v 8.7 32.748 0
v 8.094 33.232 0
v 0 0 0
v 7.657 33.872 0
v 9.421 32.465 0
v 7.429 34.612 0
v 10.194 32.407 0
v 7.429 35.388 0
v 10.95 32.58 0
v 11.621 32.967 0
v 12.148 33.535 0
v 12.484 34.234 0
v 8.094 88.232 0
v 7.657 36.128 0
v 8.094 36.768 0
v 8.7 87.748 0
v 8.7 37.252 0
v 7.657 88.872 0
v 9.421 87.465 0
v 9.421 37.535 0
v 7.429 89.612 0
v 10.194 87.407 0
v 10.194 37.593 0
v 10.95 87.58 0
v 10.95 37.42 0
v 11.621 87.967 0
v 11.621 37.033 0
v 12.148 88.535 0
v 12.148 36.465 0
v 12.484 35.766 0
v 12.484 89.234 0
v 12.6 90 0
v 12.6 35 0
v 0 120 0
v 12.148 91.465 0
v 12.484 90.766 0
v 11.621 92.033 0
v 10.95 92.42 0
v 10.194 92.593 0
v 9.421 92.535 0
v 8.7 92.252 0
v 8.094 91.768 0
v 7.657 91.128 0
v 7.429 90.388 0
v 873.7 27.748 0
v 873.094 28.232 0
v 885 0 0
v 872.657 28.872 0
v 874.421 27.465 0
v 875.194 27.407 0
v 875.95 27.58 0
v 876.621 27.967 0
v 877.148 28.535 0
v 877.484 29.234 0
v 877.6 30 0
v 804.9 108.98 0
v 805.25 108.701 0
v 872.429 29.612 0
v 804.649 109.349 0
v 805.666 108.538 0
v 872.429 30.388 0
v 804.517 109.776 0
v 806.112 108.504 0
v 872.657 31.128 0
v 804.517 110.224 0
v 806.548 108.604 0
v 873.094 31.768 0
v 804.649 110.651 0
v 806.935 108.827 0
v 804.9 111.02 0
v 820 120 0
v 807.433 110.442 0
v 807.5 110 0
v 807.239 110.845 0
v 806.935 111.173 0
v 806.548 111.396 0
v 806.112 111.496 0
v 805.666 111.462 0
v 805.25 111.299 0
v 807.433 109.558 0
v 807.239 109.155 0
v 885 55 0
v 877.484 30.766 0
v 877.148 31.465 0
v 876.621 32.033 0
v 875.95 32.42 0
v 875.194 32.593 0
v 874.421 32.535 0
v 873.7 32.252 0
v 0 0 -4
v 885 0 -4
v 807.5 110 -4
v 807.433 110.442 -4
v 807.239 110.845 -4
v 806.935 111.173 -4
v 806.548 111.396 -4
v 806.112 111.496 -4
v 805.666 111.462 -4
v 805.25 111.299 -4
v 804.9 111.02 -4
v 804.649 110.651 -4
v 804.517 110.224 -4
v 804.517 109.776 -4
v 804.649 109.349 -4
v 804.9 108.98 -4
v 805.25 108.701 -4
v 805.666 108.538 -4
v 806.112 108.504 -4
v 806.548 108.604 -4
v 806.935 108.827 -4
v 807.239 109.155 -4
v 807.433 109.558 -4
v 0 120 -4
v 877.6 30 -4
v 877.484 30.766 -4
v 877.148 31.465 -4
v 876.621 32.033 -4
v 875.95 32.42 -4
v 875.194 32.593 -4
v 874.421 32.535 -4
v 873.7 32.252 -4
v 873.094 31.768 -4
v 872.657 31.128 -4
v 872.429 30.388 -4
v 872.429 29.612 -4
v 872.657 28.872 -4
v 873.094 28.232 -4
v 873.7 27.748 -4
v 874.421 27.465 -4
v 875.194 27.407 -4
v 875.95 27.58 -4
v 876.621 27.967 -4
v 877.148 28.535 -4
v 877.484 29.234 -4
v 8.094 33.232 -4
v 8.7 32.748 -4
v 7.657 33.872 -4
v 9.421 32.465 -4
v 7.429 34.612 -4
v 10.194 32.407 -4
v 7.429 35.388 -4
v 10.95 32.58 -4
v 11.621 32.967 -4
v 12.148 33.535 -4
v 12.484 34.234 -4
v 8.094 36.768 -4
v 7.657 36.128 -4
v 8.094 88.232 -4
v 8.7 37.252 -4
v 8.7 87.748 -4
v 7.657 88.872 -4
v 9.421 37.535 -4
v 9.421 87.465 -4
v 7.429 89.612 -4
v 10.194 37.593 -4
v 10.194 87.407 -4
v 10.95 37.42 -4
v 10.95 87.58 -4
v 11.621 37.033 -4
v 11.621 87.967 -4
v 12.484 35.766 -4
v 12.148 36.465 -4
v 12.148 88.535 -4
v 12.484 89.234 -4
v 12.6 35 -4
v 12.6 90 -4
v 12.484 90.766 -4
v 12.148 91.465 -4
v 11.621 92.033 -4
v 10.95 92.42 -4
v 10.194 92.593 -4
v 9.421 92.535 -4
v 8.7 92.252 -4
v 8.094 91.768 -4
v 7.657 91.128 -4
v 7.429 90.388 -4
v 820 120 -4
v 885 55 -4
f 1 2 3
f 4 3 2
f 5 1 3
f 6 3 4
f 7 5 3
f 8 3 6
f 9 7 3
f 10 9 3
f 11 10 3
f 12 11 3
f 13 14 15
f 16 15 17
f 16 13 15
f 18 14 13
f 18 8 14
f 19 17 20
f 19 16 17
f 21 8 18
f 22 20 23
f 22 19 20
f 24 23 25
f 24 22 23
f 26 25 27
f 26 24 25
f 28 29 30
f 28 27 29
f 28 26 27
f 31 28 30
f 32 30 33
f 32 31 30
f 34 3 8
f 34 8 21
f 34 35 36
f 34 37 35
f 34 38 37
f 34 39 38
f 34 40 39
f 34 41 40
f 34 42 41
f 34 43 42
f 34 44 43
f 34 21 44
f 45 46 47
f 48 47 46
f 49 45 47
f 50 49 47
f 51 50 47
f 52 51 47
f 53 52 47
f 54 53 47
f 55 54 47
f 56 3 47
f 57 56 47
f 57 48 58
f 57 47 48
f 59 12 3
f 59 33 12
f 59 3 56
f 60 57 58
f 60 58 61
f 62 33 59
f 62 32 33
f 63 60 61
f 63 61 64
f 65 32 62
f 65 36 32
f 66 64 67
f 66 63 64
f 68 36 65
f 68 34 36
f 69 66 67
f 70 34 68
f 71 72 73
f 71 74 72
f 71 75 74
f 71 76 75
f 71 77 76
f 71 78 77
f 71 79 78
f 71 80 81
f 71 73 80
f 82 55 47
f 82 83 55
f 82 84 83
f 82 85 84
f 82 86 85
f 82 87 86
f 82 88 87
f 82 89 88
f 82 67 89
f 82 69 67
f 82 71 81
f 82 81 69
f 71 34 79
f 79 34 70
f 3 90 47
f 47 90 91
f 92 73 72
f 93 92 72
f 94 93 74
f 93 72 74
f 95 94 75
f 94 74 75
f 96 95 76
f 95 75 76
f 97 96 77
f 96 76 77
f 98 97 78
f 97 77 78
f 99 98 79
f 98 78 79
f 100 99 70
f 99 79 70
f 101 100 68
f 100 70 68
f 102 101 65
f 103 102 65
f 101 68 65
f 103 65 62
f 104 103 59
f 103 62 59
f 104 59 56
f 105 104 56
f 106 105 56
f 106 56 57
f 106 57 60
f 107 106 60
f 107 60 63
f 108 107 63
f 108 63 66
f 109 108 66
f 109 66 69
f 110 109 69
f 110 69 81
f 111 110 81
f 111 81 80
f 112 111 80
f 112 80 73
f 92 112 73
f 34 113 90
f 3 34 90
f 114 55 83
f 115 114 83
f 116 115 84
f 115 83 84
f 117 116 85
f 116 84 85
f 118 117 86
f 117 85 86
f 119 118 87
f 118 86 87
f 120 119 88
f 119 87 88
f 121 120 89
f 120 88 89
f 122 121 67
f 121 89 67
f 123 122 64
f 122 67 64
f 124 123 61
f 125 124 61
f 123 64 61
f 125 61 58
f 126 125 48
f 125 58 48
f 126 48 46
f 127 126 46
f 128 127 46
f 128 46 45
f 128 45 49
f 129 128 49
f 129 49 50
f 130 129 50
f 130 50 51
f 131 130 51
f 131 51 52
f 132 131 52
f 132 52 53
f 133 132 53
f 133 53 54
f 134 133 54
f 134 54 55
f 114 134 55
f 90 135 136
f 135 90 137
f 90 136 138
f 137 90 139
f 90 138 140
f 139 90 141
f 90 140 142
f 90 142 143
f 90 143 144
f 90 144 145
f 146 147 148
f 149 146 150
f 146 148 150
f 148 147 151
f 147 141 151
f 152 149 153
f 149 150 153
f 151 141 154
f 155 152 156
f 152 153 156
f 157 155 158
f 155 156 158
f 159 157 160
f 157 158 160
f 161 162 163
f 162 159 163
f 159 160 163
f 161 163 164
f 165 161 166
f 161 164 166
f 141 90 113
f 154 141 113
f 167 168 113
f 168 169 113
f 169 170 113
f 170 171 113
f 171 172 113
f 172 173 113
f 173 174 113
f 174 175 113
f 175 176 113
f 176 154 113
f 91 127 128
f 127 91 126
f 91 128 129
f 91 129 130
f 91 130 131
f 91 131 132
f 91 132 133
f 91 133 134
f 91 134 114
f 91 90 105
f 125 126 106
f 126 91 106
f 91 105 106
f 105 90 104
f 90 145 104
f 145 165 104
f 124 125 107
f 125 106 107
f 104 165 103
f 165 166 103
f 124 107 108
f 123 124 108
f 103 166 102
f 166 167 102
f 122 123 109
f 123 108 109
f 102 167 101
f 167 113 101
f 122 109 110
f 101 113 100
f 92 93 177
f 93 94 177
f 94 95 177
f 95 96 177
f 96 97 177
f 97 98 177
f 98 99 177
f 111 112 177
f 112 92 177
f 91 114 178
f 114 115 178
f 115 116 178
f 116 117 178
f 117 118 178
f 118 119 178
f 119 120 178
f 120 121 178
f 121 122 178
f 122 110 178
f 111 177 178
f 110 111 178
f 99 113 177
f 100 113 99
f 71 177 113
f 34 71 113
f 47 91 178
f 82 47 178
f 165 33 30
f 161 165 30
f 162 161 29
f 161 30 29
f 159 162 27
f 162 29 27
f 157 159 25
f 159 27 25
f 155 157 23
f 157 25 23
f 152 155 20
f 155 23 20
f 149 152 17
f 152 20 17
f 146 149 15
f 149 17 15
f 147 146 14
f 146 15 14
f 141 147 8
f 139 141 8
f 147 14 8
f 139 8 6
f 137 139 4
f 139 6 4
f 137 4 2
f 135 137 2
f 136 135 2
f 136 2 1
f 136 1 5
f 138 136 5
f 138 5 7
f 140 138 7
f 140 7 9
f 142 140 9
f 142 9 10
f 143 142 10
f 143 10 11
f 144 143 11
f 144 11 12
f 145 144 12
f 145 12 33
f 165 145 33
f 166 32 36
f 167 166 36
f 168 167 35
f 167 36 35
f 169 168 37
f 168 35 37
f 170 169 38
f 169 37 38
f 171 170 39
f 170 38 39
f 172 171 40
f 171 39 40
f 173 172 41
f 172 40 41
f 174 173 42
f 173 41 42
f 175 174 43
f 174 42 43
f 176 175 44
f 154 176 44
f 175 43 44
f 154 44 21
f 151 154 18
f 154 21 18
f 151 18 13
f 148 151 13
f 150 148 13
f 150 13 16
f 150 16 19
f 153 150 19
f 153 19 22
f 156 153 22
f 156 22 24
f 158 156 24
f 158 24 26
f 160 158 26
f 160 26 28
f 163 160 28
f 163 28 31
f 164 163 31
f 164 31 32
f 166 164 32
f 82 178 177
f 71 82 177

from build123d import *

# Parameters (mm, degrees)
BOSS_EXTRUDE1_DEPTH = 4
SKETCH8_R           = 2.6
CUT_EXTRUDE4_DEPTH  = 10
SKETCH9_R           = 2.6
CUT_EXTRUDE5_DEPTH  = 10
SKETCH10_R          = 1.5
CUT_EXTRUDE6_DEPTH  = 894.10749633


with BuildPart() as part:
    # Sketch1 → Boss-Extrude1 (new body)
    with BuildSketch(Plane.XY):
        Polygon((0, 0), (885, 0), (885, 55), (820, 120), (0, 120), align=None)
    extrude(amount=BOSS_EXTRUDE1_DEPTH)


with BuildPart() as part_1:
    # Body-Move/Copy1: moved
    add(part.part.moved(Location((0, 0, -4))))

    # Sketch8 → Cut-Extrude4 (cut)
    with BuildSketch(Plane.XY):
        with Locations((10, 90)):
            Circle(SKETCH8_R)
        with Locations((10, 35)):
            Circle(SKETCH8_R)
    extrude(amount=-CUT_EXTRUDE4_DEPTH, mode=Mode.SUBTRACT)

    # Sketch9 → Cut-Extrude5 (cut)
    with BuildSketch(Plane.XY):
        with Locations((875, 30)):
            Circle(SKETCH9_R)
    extrude(amount=-CUT_EXTRUDE5_DEPTH, mode=Mode.SUBTRACT)

    # Sketch10 → Cut-Extrude6 (cut, through all)
    with BuildSketch(Plane.XY):
        with Locations((806, 110)):
            Circle(SKETCH10_R)
    extrude(amount=-CUT_EXTRUDE6_DEPTH, mode=Mode.SUBTRACT)


solid = part_1.part
